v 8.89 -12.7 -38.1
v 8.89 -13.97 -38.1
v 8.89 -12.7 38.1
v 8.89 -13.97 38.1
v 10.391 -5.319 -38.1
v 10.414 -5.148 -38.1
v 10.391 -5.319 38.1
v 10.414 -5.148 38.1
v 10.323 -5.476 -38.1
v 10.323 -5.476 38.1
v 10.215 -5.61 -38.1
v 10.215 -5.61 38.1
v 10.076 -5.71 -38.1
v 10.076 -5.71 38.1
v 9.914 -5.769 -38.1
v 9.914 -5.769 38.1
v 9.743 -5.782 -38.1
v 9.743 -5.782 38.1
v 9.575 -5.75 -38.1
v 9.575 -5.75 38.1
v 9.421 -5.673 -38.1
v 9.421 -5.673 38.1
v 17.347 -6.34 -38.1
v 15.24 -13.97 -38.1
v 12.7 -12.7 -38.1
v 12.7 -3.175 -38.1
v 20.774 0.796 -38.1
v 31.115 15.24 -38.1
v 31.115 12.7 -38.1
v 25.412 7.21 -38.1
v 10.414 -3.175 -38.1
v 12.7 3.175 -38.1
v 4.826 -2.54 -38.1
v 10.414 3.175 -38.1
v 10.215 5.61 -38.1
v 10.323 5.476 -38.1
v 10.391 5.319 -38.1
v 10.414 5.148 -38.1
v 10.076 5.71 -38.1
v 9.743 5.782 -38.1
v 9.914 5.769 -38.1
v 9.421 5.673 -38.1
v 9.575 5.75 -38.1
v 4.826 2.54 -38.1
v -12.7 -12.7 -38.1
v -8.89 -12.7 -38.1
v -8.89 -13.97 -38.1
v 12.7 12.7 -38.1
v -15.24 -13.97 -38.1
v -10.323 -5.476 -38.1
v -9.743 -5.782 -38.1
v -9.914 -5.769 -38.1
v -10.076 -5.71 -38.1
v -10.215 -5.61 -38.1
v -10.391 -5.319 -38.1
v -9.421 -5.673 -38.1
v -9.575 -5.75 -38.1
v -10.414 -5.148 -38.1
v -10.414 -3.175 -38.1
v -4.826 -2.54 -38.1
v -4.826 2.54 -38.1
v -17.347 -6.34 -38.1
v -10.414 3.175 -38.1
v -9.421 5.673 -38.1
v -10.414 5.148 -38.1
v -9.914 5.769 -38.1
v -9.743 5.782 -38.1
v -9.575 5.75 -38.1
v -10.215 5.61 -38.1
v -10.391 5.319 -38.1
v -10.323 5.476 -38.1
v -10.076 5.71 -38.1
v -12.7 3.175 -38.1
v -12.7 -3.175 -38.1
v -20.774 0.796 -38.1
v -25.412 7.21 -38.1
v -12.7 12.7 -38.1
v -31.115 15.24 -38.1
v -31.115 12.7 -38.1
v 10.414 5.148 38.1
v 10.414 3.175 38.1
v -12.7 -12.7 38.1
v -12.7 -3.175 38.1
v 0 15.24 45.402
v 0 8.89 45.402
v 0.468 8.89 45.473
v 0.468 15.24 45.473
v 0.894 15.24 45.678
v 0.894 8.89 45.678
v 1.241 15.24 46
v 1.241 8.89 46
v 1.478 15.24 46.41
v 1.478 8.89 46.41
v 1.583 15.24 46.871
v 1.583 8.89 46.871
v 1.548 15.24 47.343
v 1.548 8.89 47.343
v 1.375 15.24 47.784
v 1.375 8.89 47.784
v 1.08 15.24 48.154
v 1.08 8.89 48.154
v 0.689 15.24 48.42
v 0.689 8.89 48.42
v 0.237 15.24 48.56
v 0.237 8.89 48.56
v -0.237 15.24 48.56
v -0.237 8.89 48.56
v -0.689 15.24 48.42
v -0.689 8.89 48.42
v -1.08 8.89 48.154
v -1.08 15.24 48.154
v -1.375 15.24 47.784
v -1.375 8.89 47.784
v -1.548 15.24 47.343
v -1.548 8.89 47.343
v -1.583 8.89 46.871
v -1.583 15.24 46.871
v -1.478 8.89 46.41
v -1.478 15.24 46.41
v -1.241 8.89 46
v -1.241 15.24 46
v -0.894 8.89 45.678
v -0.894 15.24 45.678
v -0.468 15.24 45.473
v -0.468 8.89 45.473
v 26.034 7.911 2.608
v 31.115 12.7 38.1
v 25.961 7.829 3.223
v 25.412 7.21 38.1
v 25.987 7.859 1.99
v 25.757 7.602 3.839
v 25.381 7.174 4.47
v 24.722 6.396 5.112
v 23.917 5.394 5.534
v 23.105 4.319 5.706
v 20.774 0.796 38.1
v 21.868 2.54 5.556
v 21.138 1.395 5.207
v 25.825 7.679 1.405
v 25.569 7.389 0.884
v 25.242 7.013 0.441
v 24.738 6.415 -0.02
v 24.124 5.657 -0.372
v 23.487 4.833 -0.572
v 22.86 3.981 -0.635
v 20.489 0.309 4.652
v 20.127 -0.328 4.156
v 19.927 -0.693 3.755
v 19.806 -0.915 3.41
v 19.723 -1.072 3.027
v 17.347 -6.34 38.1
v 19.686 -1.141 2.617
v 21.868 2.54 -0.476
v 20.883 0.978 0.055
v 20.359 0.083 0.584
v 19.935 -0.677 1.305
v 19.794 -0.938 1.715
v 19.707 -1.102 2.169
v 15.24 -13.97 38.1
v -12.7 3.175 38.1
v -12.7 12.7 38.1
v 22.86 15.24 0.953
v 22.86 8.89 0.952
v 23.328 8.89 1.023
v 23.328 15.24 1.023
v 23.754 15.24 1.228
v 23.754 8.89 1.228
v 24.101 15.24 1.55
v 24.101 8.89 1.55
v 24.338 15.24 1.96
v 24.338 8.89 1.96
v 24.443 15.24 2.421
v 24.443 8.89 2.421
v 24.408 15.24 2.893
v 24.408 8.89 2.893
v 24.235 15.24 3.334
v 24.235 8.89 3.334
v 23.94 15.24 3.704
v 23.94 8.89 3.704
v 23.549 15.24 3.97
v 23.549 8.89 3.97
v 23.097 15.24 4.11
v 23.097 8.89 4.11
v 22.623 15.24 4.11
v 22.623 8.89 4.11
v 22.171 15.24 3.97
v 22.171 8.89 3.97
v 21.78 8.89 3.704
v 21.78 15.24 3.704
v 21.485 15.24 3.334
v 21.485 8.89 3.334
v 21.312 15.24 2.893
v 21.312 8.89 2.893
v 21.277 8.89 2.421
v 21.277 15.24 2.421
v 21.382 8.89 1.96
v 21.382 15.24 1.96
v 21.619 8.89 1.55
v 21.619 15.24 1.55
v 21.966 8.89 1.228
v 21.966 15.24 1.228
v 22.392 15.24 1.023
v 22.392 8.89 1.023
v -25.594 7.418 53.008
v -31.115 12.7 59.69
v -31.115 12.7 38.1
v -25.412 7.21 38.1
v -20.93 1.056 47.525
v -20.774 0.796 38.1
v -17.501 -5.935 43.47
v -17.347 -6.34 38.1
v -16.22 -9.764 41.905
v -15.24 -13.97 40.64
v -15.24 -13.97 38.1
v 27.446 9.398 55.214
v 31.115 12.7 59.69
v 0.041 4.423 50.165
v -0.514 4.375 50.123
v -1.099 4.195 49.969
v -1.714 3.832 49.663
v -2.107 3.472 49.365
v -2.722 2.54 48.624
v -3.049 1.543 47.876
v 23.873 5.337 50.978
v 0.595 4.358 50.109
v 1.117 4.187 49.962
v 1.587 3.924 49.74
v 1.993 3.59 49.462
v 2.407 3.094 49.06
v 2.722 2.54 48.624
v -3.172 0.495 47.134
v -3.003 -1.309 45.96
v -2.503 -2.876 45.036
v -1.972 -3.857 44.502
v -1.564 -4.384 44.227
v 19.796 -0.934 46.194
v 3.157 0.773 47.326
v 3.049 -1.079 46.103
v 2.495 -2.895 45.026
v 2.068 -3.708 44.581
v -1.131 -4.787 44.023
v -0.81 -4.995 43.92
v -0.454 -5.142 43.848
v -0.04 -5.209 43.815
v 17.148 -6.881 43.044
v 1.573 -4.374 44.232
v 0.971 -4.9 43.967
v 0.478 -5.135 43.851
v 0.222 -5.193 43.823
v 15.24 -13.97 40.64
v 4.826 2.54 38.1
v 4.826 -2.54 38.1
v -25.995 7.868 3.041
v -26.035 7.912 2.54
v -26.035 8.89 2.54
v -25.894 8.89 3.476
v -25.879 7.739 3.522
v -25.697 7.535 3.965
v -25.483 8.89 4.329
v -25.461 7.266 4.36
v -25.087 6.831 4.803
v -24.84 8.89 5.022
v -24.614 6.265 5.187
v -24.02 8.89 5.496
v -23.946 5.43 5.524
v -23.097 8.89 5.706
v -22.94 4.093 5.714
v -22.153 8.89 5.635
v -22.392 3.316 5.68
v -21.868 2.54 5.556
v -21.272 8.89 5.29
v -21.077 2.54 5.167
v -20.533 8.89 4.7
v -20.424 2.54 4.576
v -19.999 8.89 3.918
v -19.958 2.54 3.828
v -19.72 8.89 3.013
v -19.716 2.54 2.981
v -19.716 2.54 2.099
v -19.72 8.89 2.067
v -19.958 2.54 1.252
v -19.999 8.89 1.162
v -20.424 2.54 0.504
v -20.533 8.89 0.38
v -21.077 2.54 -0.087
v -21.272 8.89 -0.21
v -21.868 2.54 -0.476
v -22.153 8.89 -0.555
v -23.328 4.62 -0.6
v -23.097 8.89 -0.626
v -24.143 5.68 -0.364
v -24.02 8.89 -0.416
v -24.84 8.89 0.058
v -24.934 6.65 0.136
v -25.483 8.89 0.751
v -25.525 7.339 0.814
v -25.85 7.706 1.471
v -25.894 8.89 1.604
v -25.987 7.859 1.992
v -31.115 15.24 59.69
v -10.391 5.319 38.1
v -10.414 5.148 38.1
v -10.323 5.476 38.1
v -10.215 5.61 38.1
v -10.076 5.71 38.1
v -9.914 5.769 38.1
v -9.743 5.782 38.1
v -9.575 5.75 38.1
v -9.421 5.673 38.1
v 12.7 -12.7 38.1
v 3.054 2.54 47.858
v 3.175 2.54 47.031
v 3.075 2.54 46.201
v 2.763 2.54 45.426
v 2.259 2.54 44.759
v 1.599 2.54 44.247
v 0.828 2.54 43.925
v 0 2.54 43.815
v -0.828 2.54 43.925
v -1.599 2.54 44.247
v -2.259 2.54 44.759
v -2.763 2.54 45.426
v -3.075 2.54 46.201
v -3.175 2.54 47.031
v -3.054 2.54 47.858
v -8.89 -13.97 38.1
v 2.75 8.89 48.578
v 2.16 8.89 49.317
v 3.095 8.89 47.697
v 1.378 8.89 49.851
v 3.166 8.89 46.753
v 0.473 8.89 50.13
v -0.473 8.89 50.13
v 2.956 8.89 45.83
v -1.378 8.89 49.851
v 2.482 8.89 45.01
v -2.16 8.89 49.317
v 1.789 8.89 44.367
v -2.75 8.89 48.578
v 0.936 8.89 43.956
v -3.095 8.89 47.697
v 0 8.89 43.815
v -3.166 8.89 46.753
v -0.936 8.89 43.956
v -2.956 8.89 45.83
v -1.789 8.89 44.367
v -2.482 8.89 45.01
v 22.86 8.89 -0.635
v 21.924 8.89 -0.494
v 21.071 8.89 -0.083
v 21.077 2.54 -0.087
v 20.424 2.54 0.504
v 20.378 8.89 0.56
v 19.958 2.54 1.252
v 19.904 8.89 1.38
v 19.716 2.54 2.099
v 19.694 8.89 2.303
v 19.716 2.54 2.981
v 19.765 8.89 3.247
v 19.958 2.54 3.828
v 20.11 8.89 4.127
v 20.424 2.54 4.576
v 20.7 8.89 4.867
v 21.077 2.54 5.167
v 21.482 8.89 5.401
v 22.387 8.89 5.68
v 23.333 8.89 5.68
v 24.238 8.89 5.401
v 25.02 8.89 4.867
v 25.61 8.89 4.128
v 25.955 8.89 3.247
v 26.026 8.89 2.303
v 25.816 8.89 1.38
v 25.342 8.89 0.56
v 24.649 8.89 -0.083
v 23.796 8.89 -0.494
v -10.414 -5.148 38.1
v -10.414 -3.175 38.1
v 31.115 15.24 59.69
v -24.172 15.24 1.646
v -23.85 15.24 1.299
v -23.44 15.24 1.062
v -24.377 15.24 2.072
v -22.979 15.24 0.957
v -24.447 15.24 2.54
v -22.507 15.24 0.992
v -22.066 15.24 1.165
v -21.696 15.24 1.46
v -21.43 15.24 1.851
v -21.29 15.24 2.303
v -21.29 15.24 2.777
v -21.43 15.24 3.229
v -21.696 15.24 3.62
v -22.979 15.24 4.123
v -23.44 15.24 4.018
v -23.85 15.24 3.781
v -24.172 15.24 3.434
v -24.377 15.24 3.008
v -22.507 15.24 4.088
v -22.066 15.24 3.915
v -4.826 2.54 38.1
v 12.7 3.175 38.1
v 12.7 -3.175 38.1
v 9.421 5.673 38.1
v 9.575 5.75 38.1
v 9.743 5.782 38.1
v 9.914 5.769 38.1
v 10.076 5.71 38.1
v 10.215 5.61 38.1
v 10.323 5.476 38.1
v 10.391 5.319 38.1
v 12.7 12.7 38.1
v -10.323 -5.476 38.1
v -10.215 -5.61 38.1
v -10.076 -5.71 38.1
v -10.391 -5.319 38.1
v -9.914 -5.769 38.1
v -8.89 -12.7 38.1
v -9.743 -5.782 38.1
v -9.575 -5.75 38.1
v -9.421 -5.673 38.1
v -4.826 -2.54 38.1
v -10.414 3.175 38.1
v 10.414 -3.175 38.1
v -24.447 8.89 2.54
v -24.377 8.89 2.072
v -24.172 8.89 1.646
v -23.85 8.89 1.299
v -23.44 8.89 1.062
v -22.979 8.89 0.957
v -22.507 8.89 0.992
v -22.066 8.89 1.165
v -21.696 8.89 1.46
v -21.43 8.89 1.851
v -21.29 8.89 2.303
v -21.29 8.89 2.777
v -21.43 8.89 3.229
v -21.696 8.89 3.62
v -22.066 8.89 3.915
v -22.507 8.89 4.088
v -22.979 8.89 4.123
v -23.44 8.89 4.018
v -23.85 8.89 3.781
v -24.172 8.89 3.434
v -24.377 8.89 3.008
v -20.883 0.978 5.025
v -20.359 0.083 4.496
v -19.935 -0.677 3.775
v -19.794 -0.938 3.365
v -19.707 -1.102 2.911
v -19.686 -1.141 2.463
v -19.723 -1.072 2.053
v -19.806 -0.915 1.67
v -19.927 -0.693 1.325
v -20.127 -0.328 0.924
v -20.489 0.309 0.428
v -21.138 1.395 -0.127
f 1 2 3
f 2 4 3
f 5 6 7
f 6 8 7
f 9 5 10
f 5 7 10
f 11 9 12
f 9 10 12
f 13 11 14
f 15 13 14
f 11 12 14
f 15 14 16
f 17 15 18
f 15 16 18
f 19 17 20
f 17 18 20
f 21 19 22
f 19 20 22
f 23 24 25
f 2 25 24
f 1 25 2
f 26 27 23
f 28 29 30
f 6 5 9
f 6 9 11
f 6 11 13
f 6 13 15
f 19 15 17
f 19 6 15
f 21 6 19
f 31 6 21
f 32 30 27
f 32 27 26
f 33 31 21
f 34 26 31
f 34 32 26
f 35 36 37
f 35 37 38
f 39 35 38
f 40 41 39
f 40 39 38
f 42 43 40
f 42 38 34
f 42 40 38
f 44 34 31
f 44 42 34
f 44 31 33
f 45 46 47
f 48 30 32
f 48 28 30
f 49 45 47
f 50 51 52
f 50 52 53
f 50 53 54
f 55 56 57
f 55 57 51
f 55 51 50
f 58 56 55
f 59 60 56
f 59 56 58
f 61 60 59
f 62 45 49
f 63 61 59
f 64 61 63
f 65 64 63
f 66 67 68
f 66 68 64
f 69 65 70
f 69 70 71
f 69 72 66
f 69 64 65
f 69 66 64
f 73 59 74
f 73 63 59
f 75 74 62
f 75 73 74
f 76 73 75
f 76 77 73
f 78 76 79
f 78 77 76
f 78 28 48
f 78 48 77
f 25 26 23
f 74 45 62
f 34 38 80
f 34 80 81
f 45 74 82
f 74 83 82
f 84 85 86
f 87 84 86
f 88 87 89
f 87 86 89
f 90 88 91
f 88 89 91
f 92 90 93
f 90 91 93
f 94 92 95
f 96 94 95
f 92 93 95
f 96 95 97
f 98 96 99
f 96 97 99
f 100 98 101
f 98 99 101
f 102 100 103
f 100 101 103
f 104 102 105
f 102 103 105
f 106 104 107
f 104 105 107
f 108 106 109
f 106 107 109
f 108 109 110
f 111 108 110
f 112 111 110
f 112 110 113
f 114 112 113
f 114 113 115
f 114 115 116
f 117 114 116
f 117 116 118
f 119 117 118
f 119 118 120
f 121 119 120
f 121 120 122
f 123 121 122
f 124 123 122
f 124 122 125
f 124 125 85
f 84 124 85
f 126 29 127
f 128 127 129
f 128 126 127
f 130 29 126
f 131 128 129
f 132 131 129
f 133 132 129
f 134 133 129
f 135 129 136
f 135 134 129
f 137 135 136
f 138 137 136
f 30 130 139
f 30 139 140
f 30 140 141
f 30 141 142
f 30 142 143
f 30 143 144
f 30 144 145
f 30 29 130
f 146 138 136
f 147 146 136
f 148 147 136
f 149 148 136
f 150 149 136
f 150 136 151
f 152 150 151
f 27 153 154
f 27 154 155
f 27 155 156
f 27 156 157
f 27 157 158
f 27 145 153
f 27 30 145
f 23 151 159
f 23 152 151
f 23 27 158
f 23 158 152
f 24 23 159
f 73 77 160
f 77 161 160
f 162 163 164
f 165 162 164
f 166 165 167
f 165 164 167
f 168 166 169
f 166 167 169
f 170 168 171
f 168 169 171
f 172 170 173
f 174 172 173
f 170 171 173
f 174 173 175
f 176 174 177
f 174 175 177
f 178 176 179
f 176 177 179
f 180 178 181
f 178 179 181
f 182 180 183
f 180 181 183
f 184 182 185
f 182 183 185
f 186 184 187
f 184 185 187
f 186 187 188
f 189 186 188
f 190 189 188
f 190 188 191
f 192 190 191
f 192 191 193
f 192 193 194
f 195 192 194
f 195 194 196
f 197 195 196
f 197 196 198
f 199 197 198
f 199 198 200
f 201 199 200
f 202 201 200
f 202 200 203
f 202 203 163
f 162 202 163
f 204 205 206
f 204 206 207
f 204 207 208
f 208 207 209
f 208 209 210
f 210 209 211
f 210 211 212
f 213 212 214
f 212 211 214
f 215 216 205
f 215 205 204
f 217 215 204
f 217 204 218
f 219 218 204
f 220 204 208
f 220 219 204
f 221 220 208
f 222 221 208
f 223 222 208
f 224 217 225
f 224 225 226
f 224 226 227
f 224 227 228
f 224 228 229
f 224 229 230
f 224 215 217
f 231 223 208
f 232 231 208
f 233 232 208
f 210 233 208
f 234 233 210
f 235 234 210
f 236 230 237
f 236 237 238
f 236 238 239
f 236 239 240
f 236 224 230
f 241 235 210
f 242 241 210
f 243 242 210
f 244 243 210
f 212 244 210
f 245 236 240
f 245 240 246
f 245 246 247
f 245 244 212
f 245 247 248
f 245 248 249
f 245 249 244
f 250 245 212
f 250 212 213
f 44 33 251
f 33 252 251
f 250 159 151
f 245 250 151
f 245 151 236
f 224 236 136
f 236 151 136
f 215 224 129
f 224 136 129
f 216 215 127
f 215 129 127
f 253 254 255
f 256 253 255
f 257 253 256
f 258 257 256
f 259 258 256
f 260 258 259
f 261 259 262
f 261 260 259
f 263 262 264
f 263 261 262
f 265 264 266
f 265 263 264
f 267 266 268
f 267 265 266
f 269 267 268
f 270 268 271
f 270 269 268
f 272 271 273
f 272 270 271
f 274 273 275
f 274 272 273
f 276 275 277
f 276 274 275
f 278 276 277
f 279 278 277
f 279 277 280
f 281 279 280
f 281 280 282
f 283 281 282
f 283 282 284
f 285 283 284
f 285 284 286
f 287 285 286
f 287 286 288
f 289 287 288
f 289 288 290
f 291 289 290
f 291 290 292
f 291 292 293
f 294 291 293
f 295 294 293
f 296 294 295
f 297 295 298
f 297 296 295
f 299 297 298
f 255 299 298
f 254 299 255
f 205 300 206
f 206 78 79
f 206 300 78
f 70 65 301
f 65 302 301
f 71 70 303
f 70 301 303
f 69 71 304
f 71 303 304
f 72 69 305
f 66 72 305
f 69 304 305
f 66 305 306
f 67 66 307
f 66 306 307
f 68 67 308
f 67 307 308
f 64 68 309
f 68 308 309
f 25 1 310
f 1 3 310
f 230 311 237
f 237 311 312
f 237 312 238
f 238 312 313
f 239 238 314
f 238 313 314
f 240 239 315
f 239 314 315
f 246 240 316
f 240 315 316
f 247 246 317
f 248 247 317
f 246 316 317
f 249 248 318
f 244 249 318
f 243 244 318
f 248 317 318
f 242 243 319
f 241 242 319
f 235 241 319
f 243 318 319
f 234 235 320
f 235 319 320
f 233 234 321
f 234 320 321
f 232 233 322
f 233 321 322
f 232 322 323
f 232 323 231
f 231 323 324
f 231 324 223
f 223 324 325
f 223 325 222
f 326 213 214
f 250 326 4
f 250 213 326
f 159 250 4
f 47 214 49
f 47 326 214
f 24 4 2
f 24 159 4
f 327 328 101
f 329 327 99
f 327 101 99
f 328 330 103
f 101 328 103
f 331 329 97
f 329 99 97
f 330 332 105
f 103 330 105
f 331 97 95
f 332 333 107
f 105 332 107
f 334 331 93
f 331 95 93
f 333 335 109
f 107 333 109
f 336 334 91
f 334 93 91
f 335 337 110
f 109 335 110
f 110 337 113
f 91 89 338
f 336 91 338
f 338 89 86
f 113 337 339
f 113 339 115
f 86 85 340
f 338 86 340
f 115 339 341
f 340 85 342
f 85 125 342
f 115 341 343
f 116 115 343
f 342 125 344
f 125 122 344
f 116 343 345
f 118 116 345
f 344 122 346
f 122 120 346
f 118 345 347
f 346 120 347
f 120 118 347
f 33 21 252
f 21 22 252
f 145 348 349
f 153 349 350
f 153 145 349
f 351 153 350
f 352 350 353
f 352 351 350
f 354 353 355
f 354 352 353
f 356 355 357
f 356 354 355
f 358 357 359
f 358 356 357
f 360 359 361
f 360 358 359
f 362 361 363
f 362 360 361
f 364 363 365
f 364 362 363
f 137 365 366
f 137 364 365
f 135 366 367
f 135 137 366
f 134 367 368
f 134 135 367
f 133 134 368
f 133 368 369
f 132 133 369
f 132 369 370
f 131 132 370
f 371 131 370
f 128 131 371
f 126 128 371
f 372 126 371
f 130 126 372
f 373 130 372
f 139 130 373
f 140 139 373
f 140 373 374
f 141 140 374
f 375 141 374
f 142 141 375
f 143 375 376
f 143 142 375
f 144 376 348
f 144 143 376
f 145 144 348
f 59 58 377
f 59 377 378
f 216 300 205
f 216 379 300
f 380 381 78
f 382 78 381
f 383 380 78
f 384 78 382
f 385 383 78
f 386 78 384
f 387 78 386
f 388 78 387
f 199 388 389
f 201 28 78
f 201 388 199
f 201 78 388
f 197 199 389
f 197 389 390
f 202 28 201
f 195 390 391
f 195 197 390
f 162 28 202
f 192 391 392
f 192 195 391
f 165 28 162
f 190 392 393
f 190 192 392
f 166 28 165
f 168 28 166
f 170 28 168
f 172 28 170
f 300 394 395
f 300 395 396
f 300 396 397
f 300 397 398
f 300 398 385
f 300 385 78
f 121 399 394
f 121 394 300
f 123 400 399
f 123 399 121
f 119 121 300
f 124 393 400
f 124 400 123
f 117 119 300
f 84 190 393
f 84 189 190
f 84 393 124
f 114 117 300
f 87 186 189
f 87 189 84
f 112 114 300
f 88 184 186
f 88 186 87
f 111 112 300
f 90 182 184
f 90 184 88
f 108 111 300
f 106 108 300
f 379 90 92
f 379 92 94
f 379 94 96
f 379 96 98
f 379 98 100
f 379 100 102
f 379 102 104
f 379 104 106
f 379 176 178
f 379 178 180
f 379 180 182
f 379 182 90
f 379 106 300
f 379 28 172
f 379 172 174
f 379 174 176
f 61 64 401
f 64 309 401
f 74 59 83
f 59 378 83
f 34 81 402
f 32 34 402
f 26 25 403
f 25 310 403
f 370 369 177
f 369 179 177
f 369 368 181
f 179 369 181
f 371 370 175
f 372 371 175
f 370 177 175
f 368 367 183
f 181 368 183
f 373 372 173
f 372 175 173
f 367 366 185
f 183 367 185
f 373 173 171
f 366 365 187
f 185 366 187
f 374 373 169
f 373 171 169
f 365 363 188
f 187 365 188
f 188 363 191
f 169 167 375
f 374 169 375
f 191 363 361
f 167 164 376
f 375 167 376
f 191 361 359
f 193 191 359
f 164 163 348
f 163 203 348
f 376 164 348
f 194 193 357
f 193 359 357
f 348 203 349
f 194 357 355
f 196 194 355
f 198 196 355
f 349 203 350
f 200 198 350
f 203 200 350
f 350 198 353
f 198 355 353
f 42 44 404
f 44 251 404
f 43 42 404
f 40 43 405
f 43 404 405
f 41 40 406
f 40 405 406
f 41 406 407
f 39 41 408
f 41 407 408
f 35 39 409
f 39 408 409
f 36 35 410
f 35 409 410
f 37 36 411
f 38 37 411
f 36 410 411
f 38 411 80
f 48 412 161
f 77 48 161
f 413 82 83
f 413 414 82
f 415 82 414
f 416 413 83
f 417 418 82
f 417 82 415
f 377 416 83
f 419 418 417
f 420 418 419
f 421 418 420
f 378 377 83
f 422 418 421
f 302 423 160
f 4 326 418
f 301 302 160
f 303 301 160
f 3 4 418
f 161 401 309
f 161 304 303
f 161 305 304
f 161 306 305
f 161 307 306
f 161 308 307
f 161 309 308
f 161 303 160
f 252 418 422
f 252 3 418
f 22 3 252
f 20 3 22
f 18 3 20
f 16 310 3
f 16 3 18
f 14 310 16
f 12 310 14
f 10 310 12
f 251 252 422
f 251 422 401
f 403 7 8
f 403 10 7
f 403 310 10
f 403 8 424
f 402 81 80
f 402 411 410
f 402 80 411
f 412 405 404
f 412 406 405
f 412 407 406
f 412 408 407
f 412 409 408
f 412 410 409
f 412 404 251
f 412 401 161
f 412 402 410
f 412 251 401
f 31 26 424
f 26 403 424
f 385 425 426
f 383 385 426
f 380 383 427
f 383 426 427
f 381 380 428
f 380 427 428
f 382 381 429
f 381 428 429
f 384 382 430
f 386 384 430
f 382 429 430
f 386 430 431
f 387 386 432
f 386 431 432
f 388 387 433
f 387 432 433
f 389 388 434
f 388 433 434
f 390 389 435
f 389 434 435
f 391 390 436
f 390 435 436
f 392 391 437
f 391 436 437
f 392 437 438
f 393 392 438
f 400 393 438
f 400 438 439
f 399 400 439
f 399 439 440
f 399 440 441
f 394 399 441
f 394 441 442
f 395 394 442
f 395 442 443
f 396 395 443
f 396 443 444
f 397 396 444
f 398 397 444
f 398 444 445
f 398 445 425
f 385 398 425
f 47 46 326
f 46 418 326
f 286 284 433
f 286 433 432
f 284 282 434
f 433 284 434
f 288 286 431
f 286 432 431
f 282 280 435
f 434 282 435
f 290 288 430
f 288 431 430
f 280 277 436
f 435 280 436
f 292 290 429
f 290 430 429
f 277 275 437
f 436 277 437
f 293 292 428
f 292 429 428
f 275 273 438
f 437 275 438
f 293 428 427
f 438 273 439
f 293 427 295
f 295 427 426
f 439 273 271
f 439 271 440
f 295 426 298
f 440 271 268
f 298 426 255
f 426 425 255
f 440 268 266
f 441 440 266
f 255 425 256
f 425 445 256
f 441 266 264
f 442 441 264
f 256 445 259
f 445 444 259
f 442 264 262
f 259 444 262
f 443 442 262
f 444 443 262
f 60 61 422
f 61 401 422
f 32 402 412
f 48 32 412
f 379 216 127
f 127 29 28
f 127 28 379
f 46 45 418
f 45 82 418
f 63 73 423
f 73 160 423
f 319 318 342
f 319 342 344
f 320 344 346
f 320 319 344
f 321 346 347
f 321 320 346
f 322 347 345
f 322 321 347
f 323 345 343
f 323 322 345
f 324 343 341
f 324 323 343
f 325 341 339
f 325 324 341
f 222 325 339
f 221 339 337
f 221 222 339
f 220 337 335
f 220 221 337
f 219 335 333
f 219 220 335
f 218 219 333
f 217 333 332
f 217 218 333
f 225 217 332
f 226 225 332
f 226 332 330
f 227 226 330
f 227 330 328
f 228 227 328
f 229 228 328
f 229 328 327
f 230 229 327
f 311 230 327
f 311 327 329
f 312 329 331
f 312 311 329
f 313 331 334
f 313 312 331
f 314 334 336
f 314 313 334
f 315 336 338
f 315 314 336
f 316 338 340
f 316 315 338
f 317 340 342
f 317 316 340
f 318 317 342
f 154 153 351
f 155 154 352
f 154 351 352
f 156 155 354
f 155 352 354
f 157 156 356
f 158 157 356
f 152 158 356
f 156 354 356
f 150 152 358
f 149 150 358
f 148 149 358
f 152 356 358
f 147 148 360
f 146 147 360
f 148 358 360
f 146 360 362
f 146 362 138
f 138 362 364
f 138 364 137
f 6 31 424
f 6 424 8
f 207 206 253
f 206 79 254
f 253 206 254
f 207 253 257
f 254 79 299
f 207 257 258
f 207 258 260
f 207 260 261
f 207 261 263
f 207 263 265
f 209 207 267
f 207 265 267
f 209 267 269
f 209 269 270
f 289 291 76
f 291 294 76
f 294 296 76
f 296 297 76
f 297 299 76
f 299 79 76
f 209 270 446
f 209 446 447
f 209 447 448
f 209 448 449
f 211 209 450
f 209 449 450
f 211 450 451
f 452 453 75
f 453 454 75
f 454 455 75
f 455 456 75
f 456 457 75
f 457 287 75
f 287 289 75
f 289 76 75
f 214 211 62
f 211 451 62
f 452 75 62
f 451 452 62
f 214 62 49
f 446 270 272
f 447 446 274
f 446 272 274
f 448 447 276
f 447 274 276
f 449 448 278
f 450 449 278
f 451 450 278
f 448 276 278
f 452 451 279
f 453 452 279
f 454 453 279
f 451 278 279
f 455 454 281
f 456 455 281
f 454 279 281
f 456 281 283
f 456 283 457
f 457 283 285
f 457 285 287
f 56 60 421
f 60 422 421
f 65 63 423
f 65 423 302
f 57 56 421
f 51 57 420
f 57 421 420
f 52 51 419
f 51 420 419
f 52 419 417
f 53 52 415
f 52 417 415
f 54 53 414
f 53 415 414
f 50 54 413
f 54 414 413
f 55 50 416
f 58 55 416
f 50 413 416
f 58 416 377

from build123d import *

# Parameters (mm, degrees)
BOSS_EXTRUDE1_DEPTH                  = 38.1
BOSS_EXTRUDE3_DEPTH                  = 76.2
BOSS_EXTRUDE2_REACH                  = 53.498
BOSS_EXTRUDE2_END_RADIUS             = 44.45
BOSS_EXTRUDE2_DIRECTION_2_REACH      = 53.498
BOSS_EXTRUDE2_DIRECTION_2_END_RADIUS = 44.45
CUT_EXTRUDE3_DEPTH                   = 86.067352916
CUT_EXTRUDE1_REACH                   = 71.308
SKETCH4_R                            = 3.175
CUT_EXTRUDE1_DIRECTION_2_DEPTH       = 6.35
CUT_EXTRUDE2_REACH                   = 73.089
SKETCH5_R                            = 1.5875
LPATTERN1_COUNT                      = 2
LPATTERN1_PITCH                      = 44.45
LPATTERN1_COUNT_DIR2                 = 2
LPATTERN1_PITCH_DIR2                 = 22.86
MIRROR1_COPY_1_REACH                 = 71.308
MIRROR1_COPY_1_SKETCH_R              = 3.175
MIRROR1_COPY_2_SKETCH_R              = 3.175
MIRROR1_COPY_2_DEPTH                 = 6.35
MIRROR1_COPY_3_REACH                 = 73.089
MIRROR1_COPY_3_SKETCH_R              = 1.5875


with BuildPart() as part:
    # Sketch1 → Boss-Extrude1 (new, symmetric)
    with BuildSketch(Plane.XY):
        with BuildLine():
            Line((12.7, 12.7), (-12.7, 12.7))
            Line((-12.7, 12.7), (-12.7, 3.175))
            Line((-12.7, 3.175), (-10.414, 3.175))
            Line((-10.414, 3.175), (-10.414, 5.148491853))
            ThreePointArc((-10.414, 5.148491853), (-10.075709883, 5.709908138), (-9.421281116, 5.673146216))
            Line((-9.421281116, 5.673146216), (-4.826, 2.54))
            Line((-4.826, 2.54), (-4.826, -2.54))
            Line((-4.826, -2.54), (-9.421281116, -5.673146216))
            ThreePointArc((-9.421281116, -5.673146216), (-10.075709883, -5.709908138), (-10.414, -5.148491853))
            Line((-10.414, -5.148491853), (-10.414, -3.175))
            Line((-10.414, -3.175), (-12.7, -3.175))
            Line((-12.7, -3.175), (-12.7, -12.7))
            Line((-12.7, -12.7), (-8.89, -12.7))
            Line((-8.89, -12.7), (-8.89, -13.97))
            Line((-8.89, -13.97), (-15.24, -13.97))
            Line((-15.24, -13.97), (-15.24, 15.24))
            Line((-15.24, 15.24), (15.24, 15.24))
            Line((15.24, 15.24), (15.24, -13.97))
            Line((15.24, -13.97), (8.89, -13.97))
            Line((8.89, -13.97), (8.89, -12.7))
            Line((8.89, -12.7), (12.7, -12.7))
            Line((12.7, -12.7), (12.7, -3.175))
            Line((12.7, -3.175), (10.414, -3.175))
            Line((10.414, -3.175), (10.414, -5.148491853))
            ThreePointArc((10.414, -5.148491853), (10.075709883, -5.709908138), (9.421281116, -5.673146216))
            Line((9.421281116, -5.673146216), (4.826, -2.54))
            Line((4.826, -2.54), (4.826, 2.54))
            Line((4.826, 2.54), (9.421281116, 5.673146216))
            ThreePointArc((9.421281116, 5.673146216), (10.075709883, 5.709908138), (10.414, 5.148491853))
            Line((10.414, 5.148491853), (10.414, 3.175))
            Line((10.414, 3.175), (12.7, 3.175))
            Line((12.7, 3.175), (12.7, 12.7))
        make_face()
    extrude(amount=BOSS_EXTRUDE1_DEPTH, both=True)

    # Sketch6 → Boss-Extrude3 (add)
    with BuildSketch(Plane(origin=(0, 0, -38.1), x_dir=(-1, 0, 0), z_dir=(0, 0, -1))):
        with BuildLine():
            Line((-15.24, 15.24), (-31.115, 15.24))
            Line((-31.115, 15.24), (-31.115, 12.7))
            ThreePointArc((-31.115, 12.7), (-20.774098647, 0.795596044), (-15.24, -13.97))
            Line((-15.24, -13.97), (-15.24, 15.24))
        make_face()
        with BuildLine():
            Line((15.24, 15.24), (31.115, 15.24))
            Line((31.115, 15.24), (31.115, 12.7))
            ThreePointArc((31.115, 12.7), (20.774098647, 0.795596044), (15.24, -13.97))
            Line((15.24, -13.97), (15.24, 15.24))
        make_face()
    extrude(amount=-BOSS_EXTRUDE3_DEPTH)

    # Boss-Extrude2: up to this cylinder (the profile starts outside it)
    boss_extrude2_end = Plane(origin=(58.969667359, -21.939861523, 45.16983), z_dir=(0, 0, -1)) * Cylinder(BOSS_EXTRUDE2_END_RADIUS, 196.896, mode=Mode.PRIVATE)
    # Sketch3 → Boss-Extrude2 (add, up to the surface)
    with BuildSketch(Plane(origin=(0, 0, 0), x_dir=(0, 0, -1), z_dir=(1, 0, 0)), mode=Mode.PRIVATE) as boss_extrude2_sk1:
        with BuildLine():
            Line((-59.69, 15.24), (-59.69, 12.7))
            ThreePointArc((-59.69, 12.7), (-47.617150174, 1.184892733), (-40.64, -13.97))
            Line((-40.64, -13.97), (-38.1, -13.97))
            Line((-38.1, -13.97), (-38.1, 15.24))
            Line((-38.1, 15.24), (-59.69, 15.24))
        make_face()
    boss_extrude2_tool1 = extrude(boss_extrude2_sk1.sketch, amount=BOSS_EXTRUDE2_REACH, mode=Mode.PRIVATE) - boss_extrude2_end
    add(boss_extrude2_tool1.solids().sort_by_distance((0, 5.474065, 45.16983))[0])

    # Boss-Extrude2 direction 2: up to this cylinder (the profile starts outside it)
    boss_extrude2_direction_2_end = Plane(origin=(-58.969667359, -21.939861523, 45.16983), z_dir=(0, 0, -1)) * Cylinder(BOSS_EXTRUDE2_DIRECTION_2_END_RADIUS, 196.896, mode=Mode.PRIVATE)
    # Sketch3 → Boss-Extrude2 direction 2 (add, up to the surface)
    with BuildSketch(Plane(origin=(0, 0, 0), x_dir=(0, 0, -1), z_dir=(1, 0, 0)), mode=Mode.PRIVATE) as boss_extrude2_direction_2_sk1:
        with BuildLine():
            Line((-59.69, 15.24), (-59.69, 12.7))
            ThreePointArc((-59.69, 12.7), (-47.617150174, 1.184892733), (-40.64, -13.97))
            Line((-40.64, -13.97), (-38.1, -13.97))
            Line((-38.1, -13.97), (-38.1, 15.24))
            Line((-38.1, 15.24), (-59.69, 15.24))
        make_face()
    boss_extrude2_direction_2_tool1 = extrude(boss_extrude2_direction_2_sk1.sketch, amount=-BOSS_EXTRUDE2_DIRECTION_2_REACH, mode=Mode.PRIVATE) - boss_extrude2_direction_2_end
    add(boss_extrude2_direction_2_tool1.solids().sort_by_distance((0, 5.474065, 45.16983))[0])

    # Sketch7 → Cut-Extrude3 (cut, through all)
    with BuildSketch(Plane(origin=(0, 0, 38.1), x_dir=(-1, 0, 0), z_dir=(0, 0, -1))):
        with BuildLine():
            Line((34.608624747, 15.24), (31.115, 15.24))
            Line((31.115, 15.24), (31.115, 12.7))
            ThreePointArc((31.115, 12.7), (32.830941454, 14.012461185), (34.608624747, 15.24))
        make_face()
        with BuildLine():
            Line((-31.115, 12.7), (-31.115, 15.24))
            Line((-31.115, 15.24), (-34.608624747, 15.24))
            ThreePointArc((-34.608624747, 15.24), (-32.830941454, 14.012461185), (-31.115, 12.7))
        make_face()
    extrude(amount=-CUT_EXTRUDE3_DEPTH, mode=Mode.SUBTRACT)

    # Sketch4 → Cut-Extrude1 (cut, up to next)
    with BuildSketch(Plane(origin=(0, 2.54, 0), x_dir=(1, 0, 0), z_dir=(0, 1, 0)), mode=Mode.PRIVATE) as cut_extrude1_sk1:
        with Locations(Location((0, -46.99, 0), (0, 0, 90))):
            Circle(SKETCH4_R)
    cut_extrude1_tool1 = extrude(cut_extrude1_sk1.sketch, amount=-CUT_EXTRUDE1_REACH, mode=Mode.PRIVATE) & part.part
    cut_extrude1 = cut_extrude1_tool1.solids().sort_by_distance((0, 2.54, 46.99))[0]
    add(cut_extrude1, mode=Mode.SUBTRACT)

    # Sketch4 → Cut-Extrude1 direction 2 (cut)
    with BuildSketch(Plane(origin=(0, 2.54, 0), x_dir=(1, 0, 0), z_dir=(0, 1, 0))):
        with Locations(Location((0, -46.99, 0), (0, 0, 90))):
            Circle(SKETCH4_R)
    cut_extrude1_direction_2 = extrude(amount=CUT_EXTRUDE1_DIRECTION_2_DEPTH, mode=Mode.SUBTRACT)

    # Sketch5 → Cut-Extrude2 (cut, up to next)
    with BuildSketch(Plane.XZ.offset(-8.89), mode=Mode.PRIVATE) as cut_extrude2_sk1:
        with Locations(Location((0, 46.99, 0), (0, 0, 270))):
            Circle(SKETCH5_R)
    cut_extrude2_tool1 = extrude(cut_extrude2_sk1.sketch, amount=-CUT_EXTRUDE2_REACH, mode=Mode.PRIVATE) & part.part
    cut_extrude2 = cut_extrude2_tool1.solids().sort_by_distance((0, 8.89, 46.99))[0]
    add(cut_extrude2, mode=Mode.SUBTRACT)

    # LPattern1: Cut-Extrude1, Cut-Extrude1 direction 2, Cut-Extrude2; each copy of Cut-Extrude1, Cut-Extrude2 runs up to whatever stops it at its own place
    lpattern1_before = part.part  # the part as the pattern finds it: every copy runs up to it
    lpattern1_cut_extrude1_long = extrude(cut_extrude1_sk1.sketch, amount=-CUT_EXTRUDE1_REACH, mode=Mode.PRIVATE)
    lpattern1_cut_extrude1_tool1 = lpattern1_cut_extrude1_long.moved(Location(Vector(0, 0, -1) * (1 * LPATTERN1_PITCH) + Vector(1, 0, 0) * (1 * LPATTERN1_PITCH_DIR2))) & lpattern1_before
    add(lpattern1_cut_extrude1_tool1.solids().sort_by_distance((22.86, 2.54, 2.54))[0], mode=Mode.SUBTRACT)
    add(cut_extrude1_direction_2.moved(Location(Vector(0, 0, -1) * (1 * LPATTERN1_PITCH) + Vector(1, 0, 0) * (1 * LPATTERN1_PITCH_DIR2))), mode=Mode.SUBTRACT)
    lpattern1_cut_extrude2_long = extrude(cut_extrude2_sk1.sketch, amount=-CUT_EXTRUDE2_REACH, mode=Mode.PRIVATE)
    lpattern1_cut_extrude2_tool1 = lpattern1_cut_extrude2_long.moved(Location(Vector(0, 0, -1) * (1 * LPATTERN1_PITCH) + Vector(1, 0, 0) * (1 * LPATTERN1_PITCH_DIR2))) & lpattern1_before
    add(lpattern1_cut_extrude2_tool1.solids().sort_by_distance((22.86, 8.89, 2.54))[0], mode=Mode.SUBTRACT)

    # Mirror1 copy 1 sketch → Mirror1 copy 1 (cut, up to next)
    with BuildSketch(Plane(origin=(-22.86, 2.54, -44.45), x_dir=(-1, 0, 0), z_dir=(0, 1, 0)), mode=Mode.PRIVATE) as mirror1_copy_1_sk1:
        with Locations((0, 46.99)):
            Circle(MIRROR1_COPY_1_SKETCH_R)
    mirror1_copy_1_tool1 = extrude(mirror1_copy_1_sk1.sketch, amount=-MIRROR1_COPY_1_REACH, mode=Mode.PRIVATE) & part.part
    add(mirror1_copy_1_tool1.solids().sort_by_distance((-22.86, 2.54, 2.54))[0], mode=Mode.SUBTRACT)

    # Mirror1 copy 2 sketch → Mirror1 copy 2 (cut)
    with BuildSketch(Plane(origin=(-22.86, 2.54, -44.45), x_dir=(-1, 0, 0), z_dir=(0, 1, 0))):
        with Locations((0, 46.99)):
            Circle(MIRROR1_COPY_2_SKETCH_R)
    extrude(amount=MIRROR1_COPY_2_DEPTH, mode=Mode.SUBTRACT)

    # Mirror1 copy 3 sketch → Mirror1 copy 3 (cut, up to next)
    with BuildSketch(Plane(origin=(-22.86, 8.89, -44.45), x_dir=(-1, 0, 0), z_dir=(0, -1, 0)), mode=Mode.PRIVATE) as mirror1_copy_3_sk1:
        with Locations((0, -46.99)):
            Circle(MIRROR1_COPY_3_SKETCH_R)
    mirror1_copy_3_tool1 = extrude(mirror1_copy_3_sk1.sketch, amount=-MIRROR1_COPY_3_REACH, mode=Mode.PRIVATE) & part.part
    add(mirror1_copy_3_tool1.solids().sort_by_distance((-22.86, 8.89, 2.54))[0], mode=Mode.SUBTRACT)


solid = part.part
